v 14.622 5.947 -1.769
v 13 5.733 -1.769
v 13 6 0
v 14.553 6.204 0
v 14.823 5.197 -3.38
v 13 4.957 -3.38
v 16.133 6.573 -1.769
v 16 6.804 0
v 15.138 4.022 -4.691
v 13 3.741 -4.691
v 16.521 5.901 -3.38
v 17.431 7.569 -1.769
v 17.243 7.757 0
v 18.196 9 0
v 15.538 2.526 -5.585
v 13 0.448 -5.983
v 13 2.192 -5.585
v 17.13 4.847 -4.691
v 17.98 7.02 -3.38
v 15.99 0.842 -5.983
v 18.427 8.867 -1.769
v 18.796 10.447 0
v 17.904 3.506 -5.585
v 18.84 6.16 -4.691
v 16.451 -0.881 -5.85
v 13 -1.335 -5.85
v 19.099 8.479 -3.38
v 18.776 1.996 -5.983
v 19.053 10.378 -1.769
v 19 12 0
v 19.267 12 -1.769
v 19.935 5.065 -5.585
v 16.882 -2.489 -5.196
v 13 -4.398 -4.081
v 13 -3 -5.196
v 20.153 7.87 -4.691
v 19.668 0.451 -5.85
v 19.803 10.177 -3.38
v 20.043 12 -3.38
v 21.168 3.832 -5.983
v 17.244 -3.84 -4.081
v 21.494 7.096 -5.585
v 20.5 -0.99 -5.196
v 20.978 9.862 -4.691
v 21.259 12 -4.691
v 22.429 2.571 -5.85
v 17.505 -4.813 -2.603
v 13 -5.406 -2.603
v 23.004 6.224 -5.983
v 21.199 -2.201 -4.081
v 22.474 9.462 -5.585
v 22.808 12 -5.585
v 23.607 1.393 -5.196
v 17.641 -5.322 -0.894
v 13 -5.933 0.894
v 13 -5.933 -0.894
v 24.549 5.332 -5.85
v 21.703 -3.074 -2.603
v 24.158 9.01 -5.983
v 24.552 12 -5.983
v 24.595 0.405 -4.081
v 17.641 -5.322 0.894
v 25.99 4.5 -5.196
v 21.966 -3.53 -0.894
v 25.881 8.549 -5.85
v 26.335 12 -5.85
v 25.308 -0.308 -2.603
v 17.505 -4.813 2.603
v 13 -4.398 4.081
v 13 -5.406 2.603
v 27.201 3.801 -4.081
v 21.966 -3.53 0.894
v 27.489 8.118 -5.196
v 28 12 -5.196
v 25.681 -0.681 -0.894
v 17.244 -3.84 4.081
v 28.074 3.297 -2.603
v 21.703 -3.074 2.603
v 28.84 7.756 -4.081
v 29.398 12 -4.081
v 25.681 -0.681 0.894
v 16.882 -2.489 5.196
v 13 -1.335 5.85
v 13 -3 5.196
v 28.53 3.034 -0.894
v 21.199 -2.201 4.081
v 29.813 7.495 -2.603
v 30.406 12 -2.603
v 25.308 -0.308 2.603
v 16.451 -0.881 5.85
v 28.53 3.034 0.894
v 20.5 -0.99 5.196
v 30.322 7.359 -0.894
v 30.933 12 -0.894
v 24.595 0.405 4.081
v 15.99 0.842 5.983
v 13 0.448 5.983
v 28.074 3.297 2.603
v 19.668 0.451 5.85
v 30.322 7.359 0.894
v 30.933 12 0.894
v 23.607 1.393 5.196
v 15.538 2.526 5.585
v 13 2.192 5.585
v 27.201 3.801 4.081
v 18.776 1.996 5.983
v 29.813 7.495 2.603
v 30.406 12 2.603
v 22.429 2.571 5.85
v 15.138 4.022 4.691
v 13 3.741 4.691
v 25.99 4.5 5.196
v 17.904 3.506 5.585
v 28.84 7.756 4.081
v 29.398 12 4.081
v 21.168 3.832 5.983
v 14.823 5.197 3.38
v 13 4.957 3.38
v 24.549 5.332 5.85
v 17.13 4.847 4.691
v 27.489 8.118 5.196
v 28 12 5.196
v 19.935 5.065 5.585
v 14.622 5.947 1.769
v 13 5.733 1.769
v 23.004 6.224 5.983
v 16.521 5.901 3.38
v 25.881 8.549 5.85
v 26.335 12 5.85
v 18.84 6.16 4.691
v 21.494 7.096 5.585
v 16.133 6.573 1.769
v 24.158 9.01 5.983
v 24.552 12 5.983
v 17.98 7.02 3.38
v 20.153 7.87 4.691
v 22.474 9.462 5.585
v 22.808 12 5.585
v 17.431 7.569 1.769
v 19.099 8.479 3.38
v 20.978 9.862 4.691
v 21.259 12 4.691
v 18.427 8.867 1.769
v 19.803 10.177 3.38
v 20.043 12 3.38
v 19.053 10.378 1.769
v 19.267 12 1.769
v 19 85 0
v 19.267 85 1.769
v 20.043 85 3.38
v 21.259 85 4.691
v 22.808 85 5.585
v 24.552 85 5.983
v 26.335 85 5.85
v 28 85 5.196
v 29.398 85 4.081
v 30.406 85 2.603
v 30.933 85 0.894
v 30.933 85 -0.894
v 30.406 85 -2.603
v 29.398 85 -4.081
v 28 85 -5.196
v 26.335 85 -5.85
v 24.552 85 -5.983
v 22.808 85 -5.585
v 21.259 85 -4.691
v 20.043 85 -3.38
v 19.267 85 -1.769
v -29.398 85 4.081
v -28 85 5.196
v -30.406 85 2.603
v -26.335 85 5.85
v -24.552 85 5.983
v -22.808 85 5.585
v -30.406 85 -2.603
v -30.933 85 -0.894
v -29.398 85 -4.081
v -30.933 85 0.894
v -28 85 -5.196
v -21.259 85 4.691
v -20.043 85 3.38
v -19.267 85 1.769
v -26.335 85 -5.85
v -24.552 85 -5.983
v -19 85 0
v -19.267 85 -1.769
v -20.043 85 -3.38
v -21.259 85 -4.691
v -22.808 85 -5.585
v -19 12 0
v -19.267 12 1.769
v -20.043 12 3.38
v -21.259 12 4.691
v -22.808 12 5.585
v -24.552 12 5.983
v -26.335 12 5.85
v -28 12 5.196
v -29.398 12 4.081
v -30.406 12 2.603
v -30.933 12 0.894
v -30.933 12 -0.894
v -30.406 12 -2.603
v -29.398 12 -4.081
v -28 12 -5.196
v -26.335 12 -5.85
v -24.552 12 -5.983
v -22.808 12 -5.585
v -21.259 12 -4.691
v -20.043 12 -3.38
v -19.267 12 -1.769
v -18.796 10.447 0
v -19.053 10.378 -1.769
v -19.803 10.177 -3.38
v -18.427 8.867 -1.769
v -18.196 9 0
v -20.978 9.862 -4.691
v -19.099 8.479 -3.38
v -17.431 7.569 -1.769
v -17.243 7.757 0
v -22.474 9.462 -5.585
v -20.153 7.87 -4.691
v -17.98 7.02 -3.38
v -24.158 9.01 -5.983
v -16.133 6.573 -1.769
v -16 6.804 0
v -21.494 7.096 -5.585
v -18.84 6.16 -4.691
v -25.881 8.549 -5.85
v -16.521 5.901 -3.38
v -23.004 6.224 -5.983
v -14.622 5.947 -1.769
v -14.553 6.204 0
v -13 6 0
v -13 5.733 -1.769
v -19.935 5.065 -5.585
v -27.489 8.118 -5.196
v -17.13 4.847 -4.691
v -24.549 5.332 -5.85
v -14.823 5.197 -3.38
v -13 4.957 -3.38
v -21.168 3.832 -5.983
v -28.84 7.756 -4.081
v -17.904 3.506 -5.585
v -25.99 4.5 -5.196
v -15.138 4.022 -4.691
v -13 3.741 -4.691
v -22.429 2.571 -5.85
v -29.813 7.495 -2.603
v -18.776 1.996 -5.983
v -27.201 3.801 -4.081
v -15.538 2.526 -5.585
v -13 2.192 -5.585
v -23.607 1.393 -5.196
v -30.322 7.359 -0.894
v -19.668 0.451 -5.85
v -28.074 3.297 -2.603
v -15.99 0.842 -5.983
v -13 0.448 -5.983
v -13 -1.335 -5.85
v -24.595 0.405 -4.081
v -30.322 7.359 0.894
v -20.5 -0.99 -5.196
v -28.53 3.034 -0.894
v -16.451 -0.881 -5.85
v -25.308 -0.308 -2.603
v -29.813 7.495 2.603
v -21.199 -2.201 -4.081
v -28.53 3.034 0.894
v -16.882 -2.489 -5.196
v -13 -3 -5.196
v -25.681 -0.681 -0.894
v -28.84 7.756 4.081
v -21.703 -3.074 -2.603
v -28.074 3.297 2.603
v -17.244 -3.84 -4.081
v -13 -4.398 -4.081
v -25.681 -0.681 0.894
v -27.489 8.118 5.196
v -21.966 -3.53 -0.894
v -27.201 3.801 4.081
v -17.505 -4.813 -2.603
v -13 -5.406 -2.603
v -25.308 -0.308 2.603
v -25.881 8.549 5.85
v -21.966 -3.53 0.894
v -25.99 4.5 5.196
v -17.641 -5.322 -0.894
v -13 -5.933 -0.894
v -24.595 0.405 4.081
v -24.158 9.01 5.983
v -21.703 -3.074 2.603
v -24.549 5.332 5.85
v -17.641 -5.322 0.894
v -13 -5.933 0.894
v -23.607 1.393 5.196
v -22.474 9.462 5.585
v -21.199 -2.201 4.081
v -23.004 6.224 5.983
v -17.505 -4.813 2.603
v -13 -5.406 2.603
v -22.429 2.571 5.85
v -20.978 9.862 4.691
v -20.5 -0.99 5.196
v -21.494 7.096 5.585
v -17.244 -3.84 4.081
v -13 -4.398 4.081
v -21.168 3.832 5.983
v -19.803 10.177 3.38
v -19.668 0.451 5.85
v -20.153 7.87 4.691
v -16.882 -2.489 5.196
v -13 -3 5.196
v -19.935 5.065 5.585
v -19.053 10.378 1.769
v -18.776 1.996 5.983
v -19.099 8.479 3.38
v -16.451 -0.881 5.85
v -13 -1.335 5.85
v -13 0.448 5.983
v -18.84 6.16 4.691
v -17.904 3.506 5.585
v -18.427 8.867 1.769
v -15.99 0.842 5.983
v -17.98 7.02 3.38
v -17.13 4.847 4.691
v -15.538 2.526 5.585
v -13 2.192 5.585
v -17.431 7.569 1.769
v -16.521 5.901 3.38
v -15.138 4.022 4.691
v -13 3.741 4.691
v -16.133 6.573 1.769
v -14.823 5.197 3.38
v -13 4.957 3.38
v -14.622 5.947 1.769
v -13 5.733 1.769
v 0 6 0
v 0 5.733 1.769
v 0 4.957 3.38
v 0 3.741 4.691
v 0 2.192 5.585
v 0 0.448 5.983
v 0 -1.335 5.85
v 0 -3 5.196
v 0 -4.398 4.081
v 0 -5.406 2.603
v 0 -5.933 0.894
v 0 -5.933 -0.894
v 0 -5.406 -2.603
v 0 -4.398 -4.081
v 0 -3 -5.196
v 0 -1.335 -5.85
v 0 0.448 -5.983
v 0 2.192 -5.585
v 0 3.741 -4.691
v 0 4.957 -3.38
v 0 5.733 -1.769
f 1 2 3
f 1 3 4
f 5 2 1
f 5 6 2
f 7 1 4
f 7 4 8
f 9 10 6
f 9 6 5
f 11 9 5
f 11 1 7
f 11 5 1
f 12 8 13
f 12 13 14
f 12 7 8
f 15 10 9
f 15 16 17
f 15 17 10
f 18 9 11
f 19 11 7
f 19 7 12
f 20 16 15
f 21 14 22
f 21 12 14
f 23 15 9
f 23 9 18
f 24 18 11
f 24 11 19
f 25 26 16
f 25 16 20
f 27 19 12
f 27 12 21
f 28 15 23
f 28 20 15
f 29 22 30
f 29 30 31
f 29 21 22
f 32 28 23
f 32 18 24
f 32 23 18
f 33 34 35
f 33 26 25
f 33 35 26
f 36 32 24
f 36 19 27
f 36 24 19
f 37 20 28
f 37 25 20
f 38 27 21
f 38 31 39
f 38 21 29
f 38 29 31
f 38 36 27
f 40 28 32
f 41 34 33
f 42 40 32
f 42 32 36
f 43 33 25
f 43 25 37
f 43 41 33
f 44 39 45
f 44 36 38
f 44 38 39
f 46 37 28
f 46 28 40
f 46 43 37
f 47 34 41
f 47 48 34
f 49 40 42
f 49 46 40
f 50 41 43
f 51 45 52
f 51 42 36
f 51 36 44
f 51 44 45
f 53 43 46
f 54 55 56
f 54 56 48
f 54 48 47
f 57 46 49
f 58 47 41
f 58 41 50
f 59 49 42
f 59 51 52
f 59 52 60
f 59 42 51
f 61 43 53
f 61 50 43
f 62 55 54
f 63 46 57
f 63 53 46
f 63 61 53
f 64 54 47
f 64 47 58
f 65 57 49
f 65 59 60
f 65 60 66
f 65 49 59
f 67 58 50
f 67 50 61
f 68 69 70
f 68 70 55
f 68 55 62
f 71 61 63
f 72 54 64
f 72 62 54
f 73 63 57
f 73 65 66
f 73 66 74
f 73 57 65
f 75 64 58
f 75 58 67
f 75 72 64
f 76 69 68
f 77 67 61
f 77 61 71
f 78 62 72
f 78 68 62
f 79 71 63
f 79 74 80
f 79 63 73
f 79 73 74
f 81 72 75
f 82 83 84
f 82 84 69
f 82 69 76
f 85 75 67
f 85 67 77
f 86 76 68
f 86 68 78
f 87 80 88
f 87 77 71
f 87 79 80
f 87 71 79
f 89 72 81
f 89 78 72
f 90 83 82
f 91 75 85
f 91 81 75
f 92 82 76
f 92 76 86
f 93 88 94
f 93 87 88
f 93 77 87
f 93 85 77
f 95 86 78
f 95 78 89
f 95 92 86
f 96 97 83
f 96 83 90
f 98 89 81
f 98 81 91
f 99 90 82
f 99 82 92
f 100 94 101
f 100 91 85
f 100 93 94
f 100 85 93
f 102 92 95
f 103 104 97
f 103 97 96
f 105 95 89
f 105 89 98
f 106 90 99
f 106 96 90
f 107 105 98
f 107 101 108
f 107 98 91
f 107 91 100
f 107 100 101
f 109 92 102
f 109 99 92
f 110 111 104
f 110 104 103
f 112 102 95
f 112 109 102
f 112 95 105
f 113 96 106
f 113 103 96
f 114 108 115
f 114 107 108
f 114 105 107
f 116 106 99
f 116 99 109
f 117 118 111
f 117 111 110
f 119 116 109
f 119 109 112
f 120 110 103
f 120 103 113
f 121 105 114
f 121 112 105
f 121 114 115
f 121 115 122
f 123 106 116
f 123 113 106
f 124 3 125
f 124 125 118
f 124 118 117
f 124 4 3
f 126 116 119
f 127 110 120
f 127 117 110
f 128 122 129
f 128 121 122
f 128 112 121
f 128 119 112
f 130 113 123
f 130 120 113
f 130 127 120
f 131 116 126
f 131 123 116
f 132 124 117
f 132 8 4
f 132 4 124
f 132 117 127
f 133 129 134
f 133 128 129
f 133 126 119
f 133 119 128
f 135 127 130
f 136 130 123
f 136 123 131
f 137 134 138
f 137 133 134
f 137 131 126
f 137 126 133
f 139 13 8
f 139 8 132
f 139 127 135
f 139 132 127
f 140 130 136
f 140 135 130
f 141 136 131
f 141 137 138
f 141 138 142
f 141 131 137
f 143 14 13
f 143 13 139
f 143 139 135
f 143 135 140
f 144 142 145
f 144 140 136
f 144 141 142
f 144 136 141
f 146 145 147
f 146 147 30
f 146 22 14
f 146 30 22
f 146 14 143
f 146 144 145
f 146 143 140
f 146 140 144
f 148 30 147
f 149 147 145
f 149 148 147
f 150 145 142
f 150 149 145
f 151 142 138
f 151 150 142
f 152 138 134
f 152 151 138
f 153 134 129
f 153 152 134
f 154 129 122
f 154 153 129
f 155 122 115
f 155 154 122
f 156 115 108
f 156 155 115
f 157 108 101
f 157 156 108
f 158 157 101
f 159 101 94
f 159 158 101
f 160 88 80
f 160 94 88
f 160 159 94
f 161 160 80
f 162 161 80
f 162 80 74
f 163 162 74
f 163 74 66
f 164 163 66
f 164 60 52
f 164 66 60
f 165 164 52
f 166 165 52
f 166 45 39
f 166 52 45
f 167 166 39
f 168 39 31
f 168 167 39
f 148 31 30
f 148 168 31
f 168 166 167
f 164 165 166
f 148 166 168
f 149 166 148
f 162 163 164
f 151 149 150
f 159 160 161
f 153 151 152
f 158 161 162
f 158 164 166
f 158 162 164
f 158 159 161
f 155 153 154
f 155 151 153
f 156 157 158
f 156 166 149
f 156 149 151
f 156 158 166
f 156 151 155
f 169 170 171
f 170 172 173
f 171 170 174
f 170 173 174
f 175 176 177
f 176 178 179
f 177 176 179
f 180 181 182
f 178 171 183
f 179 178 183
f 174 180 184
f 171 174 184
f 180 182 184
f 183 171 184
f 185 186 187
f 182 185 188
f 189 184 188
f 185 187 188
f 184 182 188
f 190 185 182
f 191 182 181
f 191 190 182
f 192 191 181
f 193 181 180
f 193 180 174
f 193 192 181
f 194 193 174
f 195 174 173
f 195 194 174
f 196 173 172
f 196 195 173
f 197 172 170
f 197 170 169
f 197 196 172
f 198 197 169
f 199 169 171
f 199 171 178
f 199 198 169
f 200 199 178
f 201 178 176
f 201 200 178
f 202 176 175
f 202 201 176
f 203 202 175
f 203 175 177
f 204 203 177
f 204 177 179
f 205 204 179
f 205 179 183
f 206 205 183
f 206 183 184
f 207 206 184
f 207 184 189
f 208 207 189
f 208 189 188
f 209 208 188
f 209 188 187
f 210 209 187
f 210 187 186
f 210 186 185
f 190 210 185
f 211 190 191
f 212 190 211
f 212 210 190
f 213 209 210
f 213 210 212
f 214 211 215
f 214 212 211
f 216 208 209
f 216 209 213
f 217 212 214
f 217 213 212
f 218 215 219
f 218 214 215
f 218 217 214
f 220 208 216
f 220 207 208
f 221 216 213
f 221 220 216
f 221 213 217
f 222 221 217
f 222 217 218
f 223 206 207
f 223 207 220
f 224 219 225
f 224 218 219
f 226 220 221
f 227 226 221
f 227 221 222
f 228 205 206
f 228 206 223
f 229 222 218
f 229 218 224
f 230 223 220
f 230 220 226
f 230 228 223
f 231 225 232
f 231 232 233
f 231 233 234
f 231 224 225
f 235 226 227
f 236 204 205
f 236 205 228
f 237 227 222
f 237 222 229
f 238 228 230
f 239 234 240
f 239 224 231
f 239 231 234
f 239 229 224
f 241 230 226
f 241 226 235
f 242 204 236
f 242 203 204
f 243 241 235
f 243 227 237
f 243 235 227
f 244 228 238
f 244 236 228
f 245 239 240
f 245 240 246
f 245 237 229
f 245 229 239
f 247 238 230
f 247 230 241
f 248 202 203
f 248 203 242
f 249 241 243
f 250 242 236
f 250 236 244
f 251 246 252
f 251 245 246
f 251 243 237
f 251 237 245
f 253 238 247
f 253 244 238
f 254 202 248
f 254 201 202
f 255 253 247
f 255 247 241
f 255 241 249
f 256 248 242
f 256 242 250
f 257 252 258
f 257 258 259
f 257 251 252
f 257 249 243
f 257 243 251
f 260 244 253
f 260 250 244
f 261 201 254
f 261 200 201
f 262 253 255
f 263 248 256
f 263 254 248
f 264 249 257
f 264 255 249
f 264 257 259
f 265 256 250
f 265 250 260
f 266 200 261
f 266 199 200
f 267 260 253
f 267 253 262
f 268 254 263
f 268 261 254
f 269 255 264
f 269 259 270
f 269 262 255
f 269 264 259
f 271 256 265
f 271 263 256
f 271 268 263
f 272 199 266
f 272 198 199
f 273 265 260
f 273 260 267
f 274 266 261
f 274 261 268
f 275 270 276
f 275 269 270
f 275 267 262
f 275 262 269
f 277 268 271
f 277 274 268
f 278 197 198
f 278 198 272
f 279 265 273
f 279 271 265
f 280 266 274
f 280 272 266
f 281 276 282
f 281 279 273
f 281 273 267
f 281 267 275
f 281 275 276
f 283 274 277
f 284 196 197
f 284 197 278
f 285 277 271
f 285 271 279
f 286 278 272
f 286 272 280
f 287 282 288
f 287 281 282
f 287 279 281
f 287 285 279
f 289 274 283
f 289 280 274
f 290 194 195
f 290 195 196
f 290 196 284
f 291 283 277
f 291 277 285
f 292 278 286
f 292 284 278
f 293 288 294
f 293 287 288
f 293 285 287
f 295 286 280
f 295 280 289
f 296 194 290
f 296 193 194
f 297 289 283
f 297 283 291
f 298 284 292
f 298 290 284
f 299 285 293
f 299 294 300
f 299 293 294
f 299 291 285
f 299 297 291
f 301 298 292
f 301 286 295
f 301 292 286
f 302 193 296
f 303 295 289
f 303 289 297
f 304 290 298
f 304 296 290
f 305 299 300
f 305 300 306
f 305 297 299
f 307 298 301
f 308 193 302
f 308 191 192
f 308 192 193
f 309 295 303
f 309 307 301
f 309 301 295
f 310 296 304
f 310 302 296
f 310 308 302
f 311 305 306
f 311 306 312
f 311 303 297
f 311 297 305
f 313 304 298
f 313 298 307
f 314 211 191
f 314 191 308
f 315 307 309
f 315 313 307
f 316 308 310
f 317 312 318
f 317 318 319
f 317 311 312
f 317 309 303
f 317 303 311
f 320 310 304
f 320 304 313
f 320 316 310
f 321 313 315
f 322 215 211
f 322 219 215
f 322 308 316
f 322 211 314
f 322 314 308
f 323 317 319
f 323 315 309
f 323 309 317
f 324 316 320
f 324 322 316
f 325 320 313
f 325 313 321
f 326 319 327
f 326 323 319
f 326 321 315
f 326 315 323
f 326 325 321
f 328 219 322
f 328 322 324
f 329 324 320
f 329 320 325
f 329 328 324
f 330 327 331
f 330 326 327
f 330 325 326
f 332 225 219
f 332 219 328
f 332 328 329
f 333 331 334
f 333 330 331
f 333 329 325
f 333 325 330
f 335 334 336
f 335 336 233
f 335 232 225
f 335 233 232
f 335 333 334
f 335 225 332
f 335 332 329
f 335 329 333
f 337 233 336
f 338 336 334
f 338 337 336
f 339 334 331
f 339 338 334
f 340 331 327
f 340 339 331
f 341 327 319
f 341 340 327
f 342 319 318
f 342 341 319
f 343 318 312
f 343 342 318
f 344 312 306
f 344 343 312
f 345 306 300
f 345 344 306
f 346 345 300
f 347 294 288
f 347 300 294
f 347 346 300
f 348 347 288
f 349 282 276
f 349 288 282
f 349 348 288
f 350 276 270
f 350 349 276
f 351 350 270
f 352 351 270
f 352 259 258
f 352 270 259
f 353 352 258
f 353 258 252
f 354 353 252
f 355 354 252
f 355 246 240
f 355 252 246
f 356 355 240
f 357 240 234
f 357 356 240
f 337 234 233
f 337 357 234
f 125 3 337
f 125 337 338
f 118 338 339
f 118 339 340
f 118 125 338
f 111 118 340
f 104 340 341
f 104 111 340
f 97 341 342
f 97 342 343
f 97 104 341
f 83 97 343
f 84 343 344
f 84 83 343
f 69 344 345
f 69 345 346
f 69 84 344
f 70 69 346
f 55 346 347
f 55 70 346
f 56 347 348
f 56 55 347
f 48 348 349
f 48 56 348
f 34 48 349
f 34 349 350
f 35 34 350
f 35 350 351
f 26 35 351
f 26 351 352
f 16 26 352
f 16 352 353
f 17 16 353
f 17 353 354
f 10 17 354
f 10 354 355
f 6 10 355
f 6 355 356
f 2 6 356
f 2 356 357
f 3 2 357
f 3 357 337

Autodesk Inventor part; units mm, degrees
ref_plane "YZ Plane" through (0, 0, 0) normal (1, 0, 0) x (0, 1, 0)
ref_plane "XZ Plane" through (0, 0, 0) normal (0, 1, 0) x (-1, 0, 0)
ref_plane "XY Plane" through (0, 0, 0) normal (0, 0, 1) x (1, 0, 0)
sketch "Sketch1" plane through (0, 0, 0) normal (1, 0, 0) x (0, 1, 0)
  circle A0 centre (0, 0) radius 6
  dimension "d0" = 12
sketch "Sketch2" plane through (0, 0, 0) normal (0, 0, 1) x (1, 0, 0)
  line L0 (0, 0) -> (13, 0)
  line L1 (25, 12) -> (25, 85)
  line L2 (0, 0) -> (0, 120)
  line L3 (0, 0) -> (-13, 0)
  line L4 (-25, 12) -> (-25, 85)
  arc A0 (-25, 12) -> (-13, 0) centre (-13, 12) ccw
  arc A1 (13, 0) -> (25, 12) centre (13, 12) ccw
  point P0 (25, 0)
  point P1 (-25, 0)
  dimension "d1" = 25
  dimension "d2" = 85
  dimension "d3" = 12
sweep "Sweep1" add profiles "Sketch1" path "Sketch2" path curves L1 A1 L0 L3 A0 L4
thread "Thread1"
thread "Thread2"
properties part number "Suspension_Clamp_U-Bolt"
